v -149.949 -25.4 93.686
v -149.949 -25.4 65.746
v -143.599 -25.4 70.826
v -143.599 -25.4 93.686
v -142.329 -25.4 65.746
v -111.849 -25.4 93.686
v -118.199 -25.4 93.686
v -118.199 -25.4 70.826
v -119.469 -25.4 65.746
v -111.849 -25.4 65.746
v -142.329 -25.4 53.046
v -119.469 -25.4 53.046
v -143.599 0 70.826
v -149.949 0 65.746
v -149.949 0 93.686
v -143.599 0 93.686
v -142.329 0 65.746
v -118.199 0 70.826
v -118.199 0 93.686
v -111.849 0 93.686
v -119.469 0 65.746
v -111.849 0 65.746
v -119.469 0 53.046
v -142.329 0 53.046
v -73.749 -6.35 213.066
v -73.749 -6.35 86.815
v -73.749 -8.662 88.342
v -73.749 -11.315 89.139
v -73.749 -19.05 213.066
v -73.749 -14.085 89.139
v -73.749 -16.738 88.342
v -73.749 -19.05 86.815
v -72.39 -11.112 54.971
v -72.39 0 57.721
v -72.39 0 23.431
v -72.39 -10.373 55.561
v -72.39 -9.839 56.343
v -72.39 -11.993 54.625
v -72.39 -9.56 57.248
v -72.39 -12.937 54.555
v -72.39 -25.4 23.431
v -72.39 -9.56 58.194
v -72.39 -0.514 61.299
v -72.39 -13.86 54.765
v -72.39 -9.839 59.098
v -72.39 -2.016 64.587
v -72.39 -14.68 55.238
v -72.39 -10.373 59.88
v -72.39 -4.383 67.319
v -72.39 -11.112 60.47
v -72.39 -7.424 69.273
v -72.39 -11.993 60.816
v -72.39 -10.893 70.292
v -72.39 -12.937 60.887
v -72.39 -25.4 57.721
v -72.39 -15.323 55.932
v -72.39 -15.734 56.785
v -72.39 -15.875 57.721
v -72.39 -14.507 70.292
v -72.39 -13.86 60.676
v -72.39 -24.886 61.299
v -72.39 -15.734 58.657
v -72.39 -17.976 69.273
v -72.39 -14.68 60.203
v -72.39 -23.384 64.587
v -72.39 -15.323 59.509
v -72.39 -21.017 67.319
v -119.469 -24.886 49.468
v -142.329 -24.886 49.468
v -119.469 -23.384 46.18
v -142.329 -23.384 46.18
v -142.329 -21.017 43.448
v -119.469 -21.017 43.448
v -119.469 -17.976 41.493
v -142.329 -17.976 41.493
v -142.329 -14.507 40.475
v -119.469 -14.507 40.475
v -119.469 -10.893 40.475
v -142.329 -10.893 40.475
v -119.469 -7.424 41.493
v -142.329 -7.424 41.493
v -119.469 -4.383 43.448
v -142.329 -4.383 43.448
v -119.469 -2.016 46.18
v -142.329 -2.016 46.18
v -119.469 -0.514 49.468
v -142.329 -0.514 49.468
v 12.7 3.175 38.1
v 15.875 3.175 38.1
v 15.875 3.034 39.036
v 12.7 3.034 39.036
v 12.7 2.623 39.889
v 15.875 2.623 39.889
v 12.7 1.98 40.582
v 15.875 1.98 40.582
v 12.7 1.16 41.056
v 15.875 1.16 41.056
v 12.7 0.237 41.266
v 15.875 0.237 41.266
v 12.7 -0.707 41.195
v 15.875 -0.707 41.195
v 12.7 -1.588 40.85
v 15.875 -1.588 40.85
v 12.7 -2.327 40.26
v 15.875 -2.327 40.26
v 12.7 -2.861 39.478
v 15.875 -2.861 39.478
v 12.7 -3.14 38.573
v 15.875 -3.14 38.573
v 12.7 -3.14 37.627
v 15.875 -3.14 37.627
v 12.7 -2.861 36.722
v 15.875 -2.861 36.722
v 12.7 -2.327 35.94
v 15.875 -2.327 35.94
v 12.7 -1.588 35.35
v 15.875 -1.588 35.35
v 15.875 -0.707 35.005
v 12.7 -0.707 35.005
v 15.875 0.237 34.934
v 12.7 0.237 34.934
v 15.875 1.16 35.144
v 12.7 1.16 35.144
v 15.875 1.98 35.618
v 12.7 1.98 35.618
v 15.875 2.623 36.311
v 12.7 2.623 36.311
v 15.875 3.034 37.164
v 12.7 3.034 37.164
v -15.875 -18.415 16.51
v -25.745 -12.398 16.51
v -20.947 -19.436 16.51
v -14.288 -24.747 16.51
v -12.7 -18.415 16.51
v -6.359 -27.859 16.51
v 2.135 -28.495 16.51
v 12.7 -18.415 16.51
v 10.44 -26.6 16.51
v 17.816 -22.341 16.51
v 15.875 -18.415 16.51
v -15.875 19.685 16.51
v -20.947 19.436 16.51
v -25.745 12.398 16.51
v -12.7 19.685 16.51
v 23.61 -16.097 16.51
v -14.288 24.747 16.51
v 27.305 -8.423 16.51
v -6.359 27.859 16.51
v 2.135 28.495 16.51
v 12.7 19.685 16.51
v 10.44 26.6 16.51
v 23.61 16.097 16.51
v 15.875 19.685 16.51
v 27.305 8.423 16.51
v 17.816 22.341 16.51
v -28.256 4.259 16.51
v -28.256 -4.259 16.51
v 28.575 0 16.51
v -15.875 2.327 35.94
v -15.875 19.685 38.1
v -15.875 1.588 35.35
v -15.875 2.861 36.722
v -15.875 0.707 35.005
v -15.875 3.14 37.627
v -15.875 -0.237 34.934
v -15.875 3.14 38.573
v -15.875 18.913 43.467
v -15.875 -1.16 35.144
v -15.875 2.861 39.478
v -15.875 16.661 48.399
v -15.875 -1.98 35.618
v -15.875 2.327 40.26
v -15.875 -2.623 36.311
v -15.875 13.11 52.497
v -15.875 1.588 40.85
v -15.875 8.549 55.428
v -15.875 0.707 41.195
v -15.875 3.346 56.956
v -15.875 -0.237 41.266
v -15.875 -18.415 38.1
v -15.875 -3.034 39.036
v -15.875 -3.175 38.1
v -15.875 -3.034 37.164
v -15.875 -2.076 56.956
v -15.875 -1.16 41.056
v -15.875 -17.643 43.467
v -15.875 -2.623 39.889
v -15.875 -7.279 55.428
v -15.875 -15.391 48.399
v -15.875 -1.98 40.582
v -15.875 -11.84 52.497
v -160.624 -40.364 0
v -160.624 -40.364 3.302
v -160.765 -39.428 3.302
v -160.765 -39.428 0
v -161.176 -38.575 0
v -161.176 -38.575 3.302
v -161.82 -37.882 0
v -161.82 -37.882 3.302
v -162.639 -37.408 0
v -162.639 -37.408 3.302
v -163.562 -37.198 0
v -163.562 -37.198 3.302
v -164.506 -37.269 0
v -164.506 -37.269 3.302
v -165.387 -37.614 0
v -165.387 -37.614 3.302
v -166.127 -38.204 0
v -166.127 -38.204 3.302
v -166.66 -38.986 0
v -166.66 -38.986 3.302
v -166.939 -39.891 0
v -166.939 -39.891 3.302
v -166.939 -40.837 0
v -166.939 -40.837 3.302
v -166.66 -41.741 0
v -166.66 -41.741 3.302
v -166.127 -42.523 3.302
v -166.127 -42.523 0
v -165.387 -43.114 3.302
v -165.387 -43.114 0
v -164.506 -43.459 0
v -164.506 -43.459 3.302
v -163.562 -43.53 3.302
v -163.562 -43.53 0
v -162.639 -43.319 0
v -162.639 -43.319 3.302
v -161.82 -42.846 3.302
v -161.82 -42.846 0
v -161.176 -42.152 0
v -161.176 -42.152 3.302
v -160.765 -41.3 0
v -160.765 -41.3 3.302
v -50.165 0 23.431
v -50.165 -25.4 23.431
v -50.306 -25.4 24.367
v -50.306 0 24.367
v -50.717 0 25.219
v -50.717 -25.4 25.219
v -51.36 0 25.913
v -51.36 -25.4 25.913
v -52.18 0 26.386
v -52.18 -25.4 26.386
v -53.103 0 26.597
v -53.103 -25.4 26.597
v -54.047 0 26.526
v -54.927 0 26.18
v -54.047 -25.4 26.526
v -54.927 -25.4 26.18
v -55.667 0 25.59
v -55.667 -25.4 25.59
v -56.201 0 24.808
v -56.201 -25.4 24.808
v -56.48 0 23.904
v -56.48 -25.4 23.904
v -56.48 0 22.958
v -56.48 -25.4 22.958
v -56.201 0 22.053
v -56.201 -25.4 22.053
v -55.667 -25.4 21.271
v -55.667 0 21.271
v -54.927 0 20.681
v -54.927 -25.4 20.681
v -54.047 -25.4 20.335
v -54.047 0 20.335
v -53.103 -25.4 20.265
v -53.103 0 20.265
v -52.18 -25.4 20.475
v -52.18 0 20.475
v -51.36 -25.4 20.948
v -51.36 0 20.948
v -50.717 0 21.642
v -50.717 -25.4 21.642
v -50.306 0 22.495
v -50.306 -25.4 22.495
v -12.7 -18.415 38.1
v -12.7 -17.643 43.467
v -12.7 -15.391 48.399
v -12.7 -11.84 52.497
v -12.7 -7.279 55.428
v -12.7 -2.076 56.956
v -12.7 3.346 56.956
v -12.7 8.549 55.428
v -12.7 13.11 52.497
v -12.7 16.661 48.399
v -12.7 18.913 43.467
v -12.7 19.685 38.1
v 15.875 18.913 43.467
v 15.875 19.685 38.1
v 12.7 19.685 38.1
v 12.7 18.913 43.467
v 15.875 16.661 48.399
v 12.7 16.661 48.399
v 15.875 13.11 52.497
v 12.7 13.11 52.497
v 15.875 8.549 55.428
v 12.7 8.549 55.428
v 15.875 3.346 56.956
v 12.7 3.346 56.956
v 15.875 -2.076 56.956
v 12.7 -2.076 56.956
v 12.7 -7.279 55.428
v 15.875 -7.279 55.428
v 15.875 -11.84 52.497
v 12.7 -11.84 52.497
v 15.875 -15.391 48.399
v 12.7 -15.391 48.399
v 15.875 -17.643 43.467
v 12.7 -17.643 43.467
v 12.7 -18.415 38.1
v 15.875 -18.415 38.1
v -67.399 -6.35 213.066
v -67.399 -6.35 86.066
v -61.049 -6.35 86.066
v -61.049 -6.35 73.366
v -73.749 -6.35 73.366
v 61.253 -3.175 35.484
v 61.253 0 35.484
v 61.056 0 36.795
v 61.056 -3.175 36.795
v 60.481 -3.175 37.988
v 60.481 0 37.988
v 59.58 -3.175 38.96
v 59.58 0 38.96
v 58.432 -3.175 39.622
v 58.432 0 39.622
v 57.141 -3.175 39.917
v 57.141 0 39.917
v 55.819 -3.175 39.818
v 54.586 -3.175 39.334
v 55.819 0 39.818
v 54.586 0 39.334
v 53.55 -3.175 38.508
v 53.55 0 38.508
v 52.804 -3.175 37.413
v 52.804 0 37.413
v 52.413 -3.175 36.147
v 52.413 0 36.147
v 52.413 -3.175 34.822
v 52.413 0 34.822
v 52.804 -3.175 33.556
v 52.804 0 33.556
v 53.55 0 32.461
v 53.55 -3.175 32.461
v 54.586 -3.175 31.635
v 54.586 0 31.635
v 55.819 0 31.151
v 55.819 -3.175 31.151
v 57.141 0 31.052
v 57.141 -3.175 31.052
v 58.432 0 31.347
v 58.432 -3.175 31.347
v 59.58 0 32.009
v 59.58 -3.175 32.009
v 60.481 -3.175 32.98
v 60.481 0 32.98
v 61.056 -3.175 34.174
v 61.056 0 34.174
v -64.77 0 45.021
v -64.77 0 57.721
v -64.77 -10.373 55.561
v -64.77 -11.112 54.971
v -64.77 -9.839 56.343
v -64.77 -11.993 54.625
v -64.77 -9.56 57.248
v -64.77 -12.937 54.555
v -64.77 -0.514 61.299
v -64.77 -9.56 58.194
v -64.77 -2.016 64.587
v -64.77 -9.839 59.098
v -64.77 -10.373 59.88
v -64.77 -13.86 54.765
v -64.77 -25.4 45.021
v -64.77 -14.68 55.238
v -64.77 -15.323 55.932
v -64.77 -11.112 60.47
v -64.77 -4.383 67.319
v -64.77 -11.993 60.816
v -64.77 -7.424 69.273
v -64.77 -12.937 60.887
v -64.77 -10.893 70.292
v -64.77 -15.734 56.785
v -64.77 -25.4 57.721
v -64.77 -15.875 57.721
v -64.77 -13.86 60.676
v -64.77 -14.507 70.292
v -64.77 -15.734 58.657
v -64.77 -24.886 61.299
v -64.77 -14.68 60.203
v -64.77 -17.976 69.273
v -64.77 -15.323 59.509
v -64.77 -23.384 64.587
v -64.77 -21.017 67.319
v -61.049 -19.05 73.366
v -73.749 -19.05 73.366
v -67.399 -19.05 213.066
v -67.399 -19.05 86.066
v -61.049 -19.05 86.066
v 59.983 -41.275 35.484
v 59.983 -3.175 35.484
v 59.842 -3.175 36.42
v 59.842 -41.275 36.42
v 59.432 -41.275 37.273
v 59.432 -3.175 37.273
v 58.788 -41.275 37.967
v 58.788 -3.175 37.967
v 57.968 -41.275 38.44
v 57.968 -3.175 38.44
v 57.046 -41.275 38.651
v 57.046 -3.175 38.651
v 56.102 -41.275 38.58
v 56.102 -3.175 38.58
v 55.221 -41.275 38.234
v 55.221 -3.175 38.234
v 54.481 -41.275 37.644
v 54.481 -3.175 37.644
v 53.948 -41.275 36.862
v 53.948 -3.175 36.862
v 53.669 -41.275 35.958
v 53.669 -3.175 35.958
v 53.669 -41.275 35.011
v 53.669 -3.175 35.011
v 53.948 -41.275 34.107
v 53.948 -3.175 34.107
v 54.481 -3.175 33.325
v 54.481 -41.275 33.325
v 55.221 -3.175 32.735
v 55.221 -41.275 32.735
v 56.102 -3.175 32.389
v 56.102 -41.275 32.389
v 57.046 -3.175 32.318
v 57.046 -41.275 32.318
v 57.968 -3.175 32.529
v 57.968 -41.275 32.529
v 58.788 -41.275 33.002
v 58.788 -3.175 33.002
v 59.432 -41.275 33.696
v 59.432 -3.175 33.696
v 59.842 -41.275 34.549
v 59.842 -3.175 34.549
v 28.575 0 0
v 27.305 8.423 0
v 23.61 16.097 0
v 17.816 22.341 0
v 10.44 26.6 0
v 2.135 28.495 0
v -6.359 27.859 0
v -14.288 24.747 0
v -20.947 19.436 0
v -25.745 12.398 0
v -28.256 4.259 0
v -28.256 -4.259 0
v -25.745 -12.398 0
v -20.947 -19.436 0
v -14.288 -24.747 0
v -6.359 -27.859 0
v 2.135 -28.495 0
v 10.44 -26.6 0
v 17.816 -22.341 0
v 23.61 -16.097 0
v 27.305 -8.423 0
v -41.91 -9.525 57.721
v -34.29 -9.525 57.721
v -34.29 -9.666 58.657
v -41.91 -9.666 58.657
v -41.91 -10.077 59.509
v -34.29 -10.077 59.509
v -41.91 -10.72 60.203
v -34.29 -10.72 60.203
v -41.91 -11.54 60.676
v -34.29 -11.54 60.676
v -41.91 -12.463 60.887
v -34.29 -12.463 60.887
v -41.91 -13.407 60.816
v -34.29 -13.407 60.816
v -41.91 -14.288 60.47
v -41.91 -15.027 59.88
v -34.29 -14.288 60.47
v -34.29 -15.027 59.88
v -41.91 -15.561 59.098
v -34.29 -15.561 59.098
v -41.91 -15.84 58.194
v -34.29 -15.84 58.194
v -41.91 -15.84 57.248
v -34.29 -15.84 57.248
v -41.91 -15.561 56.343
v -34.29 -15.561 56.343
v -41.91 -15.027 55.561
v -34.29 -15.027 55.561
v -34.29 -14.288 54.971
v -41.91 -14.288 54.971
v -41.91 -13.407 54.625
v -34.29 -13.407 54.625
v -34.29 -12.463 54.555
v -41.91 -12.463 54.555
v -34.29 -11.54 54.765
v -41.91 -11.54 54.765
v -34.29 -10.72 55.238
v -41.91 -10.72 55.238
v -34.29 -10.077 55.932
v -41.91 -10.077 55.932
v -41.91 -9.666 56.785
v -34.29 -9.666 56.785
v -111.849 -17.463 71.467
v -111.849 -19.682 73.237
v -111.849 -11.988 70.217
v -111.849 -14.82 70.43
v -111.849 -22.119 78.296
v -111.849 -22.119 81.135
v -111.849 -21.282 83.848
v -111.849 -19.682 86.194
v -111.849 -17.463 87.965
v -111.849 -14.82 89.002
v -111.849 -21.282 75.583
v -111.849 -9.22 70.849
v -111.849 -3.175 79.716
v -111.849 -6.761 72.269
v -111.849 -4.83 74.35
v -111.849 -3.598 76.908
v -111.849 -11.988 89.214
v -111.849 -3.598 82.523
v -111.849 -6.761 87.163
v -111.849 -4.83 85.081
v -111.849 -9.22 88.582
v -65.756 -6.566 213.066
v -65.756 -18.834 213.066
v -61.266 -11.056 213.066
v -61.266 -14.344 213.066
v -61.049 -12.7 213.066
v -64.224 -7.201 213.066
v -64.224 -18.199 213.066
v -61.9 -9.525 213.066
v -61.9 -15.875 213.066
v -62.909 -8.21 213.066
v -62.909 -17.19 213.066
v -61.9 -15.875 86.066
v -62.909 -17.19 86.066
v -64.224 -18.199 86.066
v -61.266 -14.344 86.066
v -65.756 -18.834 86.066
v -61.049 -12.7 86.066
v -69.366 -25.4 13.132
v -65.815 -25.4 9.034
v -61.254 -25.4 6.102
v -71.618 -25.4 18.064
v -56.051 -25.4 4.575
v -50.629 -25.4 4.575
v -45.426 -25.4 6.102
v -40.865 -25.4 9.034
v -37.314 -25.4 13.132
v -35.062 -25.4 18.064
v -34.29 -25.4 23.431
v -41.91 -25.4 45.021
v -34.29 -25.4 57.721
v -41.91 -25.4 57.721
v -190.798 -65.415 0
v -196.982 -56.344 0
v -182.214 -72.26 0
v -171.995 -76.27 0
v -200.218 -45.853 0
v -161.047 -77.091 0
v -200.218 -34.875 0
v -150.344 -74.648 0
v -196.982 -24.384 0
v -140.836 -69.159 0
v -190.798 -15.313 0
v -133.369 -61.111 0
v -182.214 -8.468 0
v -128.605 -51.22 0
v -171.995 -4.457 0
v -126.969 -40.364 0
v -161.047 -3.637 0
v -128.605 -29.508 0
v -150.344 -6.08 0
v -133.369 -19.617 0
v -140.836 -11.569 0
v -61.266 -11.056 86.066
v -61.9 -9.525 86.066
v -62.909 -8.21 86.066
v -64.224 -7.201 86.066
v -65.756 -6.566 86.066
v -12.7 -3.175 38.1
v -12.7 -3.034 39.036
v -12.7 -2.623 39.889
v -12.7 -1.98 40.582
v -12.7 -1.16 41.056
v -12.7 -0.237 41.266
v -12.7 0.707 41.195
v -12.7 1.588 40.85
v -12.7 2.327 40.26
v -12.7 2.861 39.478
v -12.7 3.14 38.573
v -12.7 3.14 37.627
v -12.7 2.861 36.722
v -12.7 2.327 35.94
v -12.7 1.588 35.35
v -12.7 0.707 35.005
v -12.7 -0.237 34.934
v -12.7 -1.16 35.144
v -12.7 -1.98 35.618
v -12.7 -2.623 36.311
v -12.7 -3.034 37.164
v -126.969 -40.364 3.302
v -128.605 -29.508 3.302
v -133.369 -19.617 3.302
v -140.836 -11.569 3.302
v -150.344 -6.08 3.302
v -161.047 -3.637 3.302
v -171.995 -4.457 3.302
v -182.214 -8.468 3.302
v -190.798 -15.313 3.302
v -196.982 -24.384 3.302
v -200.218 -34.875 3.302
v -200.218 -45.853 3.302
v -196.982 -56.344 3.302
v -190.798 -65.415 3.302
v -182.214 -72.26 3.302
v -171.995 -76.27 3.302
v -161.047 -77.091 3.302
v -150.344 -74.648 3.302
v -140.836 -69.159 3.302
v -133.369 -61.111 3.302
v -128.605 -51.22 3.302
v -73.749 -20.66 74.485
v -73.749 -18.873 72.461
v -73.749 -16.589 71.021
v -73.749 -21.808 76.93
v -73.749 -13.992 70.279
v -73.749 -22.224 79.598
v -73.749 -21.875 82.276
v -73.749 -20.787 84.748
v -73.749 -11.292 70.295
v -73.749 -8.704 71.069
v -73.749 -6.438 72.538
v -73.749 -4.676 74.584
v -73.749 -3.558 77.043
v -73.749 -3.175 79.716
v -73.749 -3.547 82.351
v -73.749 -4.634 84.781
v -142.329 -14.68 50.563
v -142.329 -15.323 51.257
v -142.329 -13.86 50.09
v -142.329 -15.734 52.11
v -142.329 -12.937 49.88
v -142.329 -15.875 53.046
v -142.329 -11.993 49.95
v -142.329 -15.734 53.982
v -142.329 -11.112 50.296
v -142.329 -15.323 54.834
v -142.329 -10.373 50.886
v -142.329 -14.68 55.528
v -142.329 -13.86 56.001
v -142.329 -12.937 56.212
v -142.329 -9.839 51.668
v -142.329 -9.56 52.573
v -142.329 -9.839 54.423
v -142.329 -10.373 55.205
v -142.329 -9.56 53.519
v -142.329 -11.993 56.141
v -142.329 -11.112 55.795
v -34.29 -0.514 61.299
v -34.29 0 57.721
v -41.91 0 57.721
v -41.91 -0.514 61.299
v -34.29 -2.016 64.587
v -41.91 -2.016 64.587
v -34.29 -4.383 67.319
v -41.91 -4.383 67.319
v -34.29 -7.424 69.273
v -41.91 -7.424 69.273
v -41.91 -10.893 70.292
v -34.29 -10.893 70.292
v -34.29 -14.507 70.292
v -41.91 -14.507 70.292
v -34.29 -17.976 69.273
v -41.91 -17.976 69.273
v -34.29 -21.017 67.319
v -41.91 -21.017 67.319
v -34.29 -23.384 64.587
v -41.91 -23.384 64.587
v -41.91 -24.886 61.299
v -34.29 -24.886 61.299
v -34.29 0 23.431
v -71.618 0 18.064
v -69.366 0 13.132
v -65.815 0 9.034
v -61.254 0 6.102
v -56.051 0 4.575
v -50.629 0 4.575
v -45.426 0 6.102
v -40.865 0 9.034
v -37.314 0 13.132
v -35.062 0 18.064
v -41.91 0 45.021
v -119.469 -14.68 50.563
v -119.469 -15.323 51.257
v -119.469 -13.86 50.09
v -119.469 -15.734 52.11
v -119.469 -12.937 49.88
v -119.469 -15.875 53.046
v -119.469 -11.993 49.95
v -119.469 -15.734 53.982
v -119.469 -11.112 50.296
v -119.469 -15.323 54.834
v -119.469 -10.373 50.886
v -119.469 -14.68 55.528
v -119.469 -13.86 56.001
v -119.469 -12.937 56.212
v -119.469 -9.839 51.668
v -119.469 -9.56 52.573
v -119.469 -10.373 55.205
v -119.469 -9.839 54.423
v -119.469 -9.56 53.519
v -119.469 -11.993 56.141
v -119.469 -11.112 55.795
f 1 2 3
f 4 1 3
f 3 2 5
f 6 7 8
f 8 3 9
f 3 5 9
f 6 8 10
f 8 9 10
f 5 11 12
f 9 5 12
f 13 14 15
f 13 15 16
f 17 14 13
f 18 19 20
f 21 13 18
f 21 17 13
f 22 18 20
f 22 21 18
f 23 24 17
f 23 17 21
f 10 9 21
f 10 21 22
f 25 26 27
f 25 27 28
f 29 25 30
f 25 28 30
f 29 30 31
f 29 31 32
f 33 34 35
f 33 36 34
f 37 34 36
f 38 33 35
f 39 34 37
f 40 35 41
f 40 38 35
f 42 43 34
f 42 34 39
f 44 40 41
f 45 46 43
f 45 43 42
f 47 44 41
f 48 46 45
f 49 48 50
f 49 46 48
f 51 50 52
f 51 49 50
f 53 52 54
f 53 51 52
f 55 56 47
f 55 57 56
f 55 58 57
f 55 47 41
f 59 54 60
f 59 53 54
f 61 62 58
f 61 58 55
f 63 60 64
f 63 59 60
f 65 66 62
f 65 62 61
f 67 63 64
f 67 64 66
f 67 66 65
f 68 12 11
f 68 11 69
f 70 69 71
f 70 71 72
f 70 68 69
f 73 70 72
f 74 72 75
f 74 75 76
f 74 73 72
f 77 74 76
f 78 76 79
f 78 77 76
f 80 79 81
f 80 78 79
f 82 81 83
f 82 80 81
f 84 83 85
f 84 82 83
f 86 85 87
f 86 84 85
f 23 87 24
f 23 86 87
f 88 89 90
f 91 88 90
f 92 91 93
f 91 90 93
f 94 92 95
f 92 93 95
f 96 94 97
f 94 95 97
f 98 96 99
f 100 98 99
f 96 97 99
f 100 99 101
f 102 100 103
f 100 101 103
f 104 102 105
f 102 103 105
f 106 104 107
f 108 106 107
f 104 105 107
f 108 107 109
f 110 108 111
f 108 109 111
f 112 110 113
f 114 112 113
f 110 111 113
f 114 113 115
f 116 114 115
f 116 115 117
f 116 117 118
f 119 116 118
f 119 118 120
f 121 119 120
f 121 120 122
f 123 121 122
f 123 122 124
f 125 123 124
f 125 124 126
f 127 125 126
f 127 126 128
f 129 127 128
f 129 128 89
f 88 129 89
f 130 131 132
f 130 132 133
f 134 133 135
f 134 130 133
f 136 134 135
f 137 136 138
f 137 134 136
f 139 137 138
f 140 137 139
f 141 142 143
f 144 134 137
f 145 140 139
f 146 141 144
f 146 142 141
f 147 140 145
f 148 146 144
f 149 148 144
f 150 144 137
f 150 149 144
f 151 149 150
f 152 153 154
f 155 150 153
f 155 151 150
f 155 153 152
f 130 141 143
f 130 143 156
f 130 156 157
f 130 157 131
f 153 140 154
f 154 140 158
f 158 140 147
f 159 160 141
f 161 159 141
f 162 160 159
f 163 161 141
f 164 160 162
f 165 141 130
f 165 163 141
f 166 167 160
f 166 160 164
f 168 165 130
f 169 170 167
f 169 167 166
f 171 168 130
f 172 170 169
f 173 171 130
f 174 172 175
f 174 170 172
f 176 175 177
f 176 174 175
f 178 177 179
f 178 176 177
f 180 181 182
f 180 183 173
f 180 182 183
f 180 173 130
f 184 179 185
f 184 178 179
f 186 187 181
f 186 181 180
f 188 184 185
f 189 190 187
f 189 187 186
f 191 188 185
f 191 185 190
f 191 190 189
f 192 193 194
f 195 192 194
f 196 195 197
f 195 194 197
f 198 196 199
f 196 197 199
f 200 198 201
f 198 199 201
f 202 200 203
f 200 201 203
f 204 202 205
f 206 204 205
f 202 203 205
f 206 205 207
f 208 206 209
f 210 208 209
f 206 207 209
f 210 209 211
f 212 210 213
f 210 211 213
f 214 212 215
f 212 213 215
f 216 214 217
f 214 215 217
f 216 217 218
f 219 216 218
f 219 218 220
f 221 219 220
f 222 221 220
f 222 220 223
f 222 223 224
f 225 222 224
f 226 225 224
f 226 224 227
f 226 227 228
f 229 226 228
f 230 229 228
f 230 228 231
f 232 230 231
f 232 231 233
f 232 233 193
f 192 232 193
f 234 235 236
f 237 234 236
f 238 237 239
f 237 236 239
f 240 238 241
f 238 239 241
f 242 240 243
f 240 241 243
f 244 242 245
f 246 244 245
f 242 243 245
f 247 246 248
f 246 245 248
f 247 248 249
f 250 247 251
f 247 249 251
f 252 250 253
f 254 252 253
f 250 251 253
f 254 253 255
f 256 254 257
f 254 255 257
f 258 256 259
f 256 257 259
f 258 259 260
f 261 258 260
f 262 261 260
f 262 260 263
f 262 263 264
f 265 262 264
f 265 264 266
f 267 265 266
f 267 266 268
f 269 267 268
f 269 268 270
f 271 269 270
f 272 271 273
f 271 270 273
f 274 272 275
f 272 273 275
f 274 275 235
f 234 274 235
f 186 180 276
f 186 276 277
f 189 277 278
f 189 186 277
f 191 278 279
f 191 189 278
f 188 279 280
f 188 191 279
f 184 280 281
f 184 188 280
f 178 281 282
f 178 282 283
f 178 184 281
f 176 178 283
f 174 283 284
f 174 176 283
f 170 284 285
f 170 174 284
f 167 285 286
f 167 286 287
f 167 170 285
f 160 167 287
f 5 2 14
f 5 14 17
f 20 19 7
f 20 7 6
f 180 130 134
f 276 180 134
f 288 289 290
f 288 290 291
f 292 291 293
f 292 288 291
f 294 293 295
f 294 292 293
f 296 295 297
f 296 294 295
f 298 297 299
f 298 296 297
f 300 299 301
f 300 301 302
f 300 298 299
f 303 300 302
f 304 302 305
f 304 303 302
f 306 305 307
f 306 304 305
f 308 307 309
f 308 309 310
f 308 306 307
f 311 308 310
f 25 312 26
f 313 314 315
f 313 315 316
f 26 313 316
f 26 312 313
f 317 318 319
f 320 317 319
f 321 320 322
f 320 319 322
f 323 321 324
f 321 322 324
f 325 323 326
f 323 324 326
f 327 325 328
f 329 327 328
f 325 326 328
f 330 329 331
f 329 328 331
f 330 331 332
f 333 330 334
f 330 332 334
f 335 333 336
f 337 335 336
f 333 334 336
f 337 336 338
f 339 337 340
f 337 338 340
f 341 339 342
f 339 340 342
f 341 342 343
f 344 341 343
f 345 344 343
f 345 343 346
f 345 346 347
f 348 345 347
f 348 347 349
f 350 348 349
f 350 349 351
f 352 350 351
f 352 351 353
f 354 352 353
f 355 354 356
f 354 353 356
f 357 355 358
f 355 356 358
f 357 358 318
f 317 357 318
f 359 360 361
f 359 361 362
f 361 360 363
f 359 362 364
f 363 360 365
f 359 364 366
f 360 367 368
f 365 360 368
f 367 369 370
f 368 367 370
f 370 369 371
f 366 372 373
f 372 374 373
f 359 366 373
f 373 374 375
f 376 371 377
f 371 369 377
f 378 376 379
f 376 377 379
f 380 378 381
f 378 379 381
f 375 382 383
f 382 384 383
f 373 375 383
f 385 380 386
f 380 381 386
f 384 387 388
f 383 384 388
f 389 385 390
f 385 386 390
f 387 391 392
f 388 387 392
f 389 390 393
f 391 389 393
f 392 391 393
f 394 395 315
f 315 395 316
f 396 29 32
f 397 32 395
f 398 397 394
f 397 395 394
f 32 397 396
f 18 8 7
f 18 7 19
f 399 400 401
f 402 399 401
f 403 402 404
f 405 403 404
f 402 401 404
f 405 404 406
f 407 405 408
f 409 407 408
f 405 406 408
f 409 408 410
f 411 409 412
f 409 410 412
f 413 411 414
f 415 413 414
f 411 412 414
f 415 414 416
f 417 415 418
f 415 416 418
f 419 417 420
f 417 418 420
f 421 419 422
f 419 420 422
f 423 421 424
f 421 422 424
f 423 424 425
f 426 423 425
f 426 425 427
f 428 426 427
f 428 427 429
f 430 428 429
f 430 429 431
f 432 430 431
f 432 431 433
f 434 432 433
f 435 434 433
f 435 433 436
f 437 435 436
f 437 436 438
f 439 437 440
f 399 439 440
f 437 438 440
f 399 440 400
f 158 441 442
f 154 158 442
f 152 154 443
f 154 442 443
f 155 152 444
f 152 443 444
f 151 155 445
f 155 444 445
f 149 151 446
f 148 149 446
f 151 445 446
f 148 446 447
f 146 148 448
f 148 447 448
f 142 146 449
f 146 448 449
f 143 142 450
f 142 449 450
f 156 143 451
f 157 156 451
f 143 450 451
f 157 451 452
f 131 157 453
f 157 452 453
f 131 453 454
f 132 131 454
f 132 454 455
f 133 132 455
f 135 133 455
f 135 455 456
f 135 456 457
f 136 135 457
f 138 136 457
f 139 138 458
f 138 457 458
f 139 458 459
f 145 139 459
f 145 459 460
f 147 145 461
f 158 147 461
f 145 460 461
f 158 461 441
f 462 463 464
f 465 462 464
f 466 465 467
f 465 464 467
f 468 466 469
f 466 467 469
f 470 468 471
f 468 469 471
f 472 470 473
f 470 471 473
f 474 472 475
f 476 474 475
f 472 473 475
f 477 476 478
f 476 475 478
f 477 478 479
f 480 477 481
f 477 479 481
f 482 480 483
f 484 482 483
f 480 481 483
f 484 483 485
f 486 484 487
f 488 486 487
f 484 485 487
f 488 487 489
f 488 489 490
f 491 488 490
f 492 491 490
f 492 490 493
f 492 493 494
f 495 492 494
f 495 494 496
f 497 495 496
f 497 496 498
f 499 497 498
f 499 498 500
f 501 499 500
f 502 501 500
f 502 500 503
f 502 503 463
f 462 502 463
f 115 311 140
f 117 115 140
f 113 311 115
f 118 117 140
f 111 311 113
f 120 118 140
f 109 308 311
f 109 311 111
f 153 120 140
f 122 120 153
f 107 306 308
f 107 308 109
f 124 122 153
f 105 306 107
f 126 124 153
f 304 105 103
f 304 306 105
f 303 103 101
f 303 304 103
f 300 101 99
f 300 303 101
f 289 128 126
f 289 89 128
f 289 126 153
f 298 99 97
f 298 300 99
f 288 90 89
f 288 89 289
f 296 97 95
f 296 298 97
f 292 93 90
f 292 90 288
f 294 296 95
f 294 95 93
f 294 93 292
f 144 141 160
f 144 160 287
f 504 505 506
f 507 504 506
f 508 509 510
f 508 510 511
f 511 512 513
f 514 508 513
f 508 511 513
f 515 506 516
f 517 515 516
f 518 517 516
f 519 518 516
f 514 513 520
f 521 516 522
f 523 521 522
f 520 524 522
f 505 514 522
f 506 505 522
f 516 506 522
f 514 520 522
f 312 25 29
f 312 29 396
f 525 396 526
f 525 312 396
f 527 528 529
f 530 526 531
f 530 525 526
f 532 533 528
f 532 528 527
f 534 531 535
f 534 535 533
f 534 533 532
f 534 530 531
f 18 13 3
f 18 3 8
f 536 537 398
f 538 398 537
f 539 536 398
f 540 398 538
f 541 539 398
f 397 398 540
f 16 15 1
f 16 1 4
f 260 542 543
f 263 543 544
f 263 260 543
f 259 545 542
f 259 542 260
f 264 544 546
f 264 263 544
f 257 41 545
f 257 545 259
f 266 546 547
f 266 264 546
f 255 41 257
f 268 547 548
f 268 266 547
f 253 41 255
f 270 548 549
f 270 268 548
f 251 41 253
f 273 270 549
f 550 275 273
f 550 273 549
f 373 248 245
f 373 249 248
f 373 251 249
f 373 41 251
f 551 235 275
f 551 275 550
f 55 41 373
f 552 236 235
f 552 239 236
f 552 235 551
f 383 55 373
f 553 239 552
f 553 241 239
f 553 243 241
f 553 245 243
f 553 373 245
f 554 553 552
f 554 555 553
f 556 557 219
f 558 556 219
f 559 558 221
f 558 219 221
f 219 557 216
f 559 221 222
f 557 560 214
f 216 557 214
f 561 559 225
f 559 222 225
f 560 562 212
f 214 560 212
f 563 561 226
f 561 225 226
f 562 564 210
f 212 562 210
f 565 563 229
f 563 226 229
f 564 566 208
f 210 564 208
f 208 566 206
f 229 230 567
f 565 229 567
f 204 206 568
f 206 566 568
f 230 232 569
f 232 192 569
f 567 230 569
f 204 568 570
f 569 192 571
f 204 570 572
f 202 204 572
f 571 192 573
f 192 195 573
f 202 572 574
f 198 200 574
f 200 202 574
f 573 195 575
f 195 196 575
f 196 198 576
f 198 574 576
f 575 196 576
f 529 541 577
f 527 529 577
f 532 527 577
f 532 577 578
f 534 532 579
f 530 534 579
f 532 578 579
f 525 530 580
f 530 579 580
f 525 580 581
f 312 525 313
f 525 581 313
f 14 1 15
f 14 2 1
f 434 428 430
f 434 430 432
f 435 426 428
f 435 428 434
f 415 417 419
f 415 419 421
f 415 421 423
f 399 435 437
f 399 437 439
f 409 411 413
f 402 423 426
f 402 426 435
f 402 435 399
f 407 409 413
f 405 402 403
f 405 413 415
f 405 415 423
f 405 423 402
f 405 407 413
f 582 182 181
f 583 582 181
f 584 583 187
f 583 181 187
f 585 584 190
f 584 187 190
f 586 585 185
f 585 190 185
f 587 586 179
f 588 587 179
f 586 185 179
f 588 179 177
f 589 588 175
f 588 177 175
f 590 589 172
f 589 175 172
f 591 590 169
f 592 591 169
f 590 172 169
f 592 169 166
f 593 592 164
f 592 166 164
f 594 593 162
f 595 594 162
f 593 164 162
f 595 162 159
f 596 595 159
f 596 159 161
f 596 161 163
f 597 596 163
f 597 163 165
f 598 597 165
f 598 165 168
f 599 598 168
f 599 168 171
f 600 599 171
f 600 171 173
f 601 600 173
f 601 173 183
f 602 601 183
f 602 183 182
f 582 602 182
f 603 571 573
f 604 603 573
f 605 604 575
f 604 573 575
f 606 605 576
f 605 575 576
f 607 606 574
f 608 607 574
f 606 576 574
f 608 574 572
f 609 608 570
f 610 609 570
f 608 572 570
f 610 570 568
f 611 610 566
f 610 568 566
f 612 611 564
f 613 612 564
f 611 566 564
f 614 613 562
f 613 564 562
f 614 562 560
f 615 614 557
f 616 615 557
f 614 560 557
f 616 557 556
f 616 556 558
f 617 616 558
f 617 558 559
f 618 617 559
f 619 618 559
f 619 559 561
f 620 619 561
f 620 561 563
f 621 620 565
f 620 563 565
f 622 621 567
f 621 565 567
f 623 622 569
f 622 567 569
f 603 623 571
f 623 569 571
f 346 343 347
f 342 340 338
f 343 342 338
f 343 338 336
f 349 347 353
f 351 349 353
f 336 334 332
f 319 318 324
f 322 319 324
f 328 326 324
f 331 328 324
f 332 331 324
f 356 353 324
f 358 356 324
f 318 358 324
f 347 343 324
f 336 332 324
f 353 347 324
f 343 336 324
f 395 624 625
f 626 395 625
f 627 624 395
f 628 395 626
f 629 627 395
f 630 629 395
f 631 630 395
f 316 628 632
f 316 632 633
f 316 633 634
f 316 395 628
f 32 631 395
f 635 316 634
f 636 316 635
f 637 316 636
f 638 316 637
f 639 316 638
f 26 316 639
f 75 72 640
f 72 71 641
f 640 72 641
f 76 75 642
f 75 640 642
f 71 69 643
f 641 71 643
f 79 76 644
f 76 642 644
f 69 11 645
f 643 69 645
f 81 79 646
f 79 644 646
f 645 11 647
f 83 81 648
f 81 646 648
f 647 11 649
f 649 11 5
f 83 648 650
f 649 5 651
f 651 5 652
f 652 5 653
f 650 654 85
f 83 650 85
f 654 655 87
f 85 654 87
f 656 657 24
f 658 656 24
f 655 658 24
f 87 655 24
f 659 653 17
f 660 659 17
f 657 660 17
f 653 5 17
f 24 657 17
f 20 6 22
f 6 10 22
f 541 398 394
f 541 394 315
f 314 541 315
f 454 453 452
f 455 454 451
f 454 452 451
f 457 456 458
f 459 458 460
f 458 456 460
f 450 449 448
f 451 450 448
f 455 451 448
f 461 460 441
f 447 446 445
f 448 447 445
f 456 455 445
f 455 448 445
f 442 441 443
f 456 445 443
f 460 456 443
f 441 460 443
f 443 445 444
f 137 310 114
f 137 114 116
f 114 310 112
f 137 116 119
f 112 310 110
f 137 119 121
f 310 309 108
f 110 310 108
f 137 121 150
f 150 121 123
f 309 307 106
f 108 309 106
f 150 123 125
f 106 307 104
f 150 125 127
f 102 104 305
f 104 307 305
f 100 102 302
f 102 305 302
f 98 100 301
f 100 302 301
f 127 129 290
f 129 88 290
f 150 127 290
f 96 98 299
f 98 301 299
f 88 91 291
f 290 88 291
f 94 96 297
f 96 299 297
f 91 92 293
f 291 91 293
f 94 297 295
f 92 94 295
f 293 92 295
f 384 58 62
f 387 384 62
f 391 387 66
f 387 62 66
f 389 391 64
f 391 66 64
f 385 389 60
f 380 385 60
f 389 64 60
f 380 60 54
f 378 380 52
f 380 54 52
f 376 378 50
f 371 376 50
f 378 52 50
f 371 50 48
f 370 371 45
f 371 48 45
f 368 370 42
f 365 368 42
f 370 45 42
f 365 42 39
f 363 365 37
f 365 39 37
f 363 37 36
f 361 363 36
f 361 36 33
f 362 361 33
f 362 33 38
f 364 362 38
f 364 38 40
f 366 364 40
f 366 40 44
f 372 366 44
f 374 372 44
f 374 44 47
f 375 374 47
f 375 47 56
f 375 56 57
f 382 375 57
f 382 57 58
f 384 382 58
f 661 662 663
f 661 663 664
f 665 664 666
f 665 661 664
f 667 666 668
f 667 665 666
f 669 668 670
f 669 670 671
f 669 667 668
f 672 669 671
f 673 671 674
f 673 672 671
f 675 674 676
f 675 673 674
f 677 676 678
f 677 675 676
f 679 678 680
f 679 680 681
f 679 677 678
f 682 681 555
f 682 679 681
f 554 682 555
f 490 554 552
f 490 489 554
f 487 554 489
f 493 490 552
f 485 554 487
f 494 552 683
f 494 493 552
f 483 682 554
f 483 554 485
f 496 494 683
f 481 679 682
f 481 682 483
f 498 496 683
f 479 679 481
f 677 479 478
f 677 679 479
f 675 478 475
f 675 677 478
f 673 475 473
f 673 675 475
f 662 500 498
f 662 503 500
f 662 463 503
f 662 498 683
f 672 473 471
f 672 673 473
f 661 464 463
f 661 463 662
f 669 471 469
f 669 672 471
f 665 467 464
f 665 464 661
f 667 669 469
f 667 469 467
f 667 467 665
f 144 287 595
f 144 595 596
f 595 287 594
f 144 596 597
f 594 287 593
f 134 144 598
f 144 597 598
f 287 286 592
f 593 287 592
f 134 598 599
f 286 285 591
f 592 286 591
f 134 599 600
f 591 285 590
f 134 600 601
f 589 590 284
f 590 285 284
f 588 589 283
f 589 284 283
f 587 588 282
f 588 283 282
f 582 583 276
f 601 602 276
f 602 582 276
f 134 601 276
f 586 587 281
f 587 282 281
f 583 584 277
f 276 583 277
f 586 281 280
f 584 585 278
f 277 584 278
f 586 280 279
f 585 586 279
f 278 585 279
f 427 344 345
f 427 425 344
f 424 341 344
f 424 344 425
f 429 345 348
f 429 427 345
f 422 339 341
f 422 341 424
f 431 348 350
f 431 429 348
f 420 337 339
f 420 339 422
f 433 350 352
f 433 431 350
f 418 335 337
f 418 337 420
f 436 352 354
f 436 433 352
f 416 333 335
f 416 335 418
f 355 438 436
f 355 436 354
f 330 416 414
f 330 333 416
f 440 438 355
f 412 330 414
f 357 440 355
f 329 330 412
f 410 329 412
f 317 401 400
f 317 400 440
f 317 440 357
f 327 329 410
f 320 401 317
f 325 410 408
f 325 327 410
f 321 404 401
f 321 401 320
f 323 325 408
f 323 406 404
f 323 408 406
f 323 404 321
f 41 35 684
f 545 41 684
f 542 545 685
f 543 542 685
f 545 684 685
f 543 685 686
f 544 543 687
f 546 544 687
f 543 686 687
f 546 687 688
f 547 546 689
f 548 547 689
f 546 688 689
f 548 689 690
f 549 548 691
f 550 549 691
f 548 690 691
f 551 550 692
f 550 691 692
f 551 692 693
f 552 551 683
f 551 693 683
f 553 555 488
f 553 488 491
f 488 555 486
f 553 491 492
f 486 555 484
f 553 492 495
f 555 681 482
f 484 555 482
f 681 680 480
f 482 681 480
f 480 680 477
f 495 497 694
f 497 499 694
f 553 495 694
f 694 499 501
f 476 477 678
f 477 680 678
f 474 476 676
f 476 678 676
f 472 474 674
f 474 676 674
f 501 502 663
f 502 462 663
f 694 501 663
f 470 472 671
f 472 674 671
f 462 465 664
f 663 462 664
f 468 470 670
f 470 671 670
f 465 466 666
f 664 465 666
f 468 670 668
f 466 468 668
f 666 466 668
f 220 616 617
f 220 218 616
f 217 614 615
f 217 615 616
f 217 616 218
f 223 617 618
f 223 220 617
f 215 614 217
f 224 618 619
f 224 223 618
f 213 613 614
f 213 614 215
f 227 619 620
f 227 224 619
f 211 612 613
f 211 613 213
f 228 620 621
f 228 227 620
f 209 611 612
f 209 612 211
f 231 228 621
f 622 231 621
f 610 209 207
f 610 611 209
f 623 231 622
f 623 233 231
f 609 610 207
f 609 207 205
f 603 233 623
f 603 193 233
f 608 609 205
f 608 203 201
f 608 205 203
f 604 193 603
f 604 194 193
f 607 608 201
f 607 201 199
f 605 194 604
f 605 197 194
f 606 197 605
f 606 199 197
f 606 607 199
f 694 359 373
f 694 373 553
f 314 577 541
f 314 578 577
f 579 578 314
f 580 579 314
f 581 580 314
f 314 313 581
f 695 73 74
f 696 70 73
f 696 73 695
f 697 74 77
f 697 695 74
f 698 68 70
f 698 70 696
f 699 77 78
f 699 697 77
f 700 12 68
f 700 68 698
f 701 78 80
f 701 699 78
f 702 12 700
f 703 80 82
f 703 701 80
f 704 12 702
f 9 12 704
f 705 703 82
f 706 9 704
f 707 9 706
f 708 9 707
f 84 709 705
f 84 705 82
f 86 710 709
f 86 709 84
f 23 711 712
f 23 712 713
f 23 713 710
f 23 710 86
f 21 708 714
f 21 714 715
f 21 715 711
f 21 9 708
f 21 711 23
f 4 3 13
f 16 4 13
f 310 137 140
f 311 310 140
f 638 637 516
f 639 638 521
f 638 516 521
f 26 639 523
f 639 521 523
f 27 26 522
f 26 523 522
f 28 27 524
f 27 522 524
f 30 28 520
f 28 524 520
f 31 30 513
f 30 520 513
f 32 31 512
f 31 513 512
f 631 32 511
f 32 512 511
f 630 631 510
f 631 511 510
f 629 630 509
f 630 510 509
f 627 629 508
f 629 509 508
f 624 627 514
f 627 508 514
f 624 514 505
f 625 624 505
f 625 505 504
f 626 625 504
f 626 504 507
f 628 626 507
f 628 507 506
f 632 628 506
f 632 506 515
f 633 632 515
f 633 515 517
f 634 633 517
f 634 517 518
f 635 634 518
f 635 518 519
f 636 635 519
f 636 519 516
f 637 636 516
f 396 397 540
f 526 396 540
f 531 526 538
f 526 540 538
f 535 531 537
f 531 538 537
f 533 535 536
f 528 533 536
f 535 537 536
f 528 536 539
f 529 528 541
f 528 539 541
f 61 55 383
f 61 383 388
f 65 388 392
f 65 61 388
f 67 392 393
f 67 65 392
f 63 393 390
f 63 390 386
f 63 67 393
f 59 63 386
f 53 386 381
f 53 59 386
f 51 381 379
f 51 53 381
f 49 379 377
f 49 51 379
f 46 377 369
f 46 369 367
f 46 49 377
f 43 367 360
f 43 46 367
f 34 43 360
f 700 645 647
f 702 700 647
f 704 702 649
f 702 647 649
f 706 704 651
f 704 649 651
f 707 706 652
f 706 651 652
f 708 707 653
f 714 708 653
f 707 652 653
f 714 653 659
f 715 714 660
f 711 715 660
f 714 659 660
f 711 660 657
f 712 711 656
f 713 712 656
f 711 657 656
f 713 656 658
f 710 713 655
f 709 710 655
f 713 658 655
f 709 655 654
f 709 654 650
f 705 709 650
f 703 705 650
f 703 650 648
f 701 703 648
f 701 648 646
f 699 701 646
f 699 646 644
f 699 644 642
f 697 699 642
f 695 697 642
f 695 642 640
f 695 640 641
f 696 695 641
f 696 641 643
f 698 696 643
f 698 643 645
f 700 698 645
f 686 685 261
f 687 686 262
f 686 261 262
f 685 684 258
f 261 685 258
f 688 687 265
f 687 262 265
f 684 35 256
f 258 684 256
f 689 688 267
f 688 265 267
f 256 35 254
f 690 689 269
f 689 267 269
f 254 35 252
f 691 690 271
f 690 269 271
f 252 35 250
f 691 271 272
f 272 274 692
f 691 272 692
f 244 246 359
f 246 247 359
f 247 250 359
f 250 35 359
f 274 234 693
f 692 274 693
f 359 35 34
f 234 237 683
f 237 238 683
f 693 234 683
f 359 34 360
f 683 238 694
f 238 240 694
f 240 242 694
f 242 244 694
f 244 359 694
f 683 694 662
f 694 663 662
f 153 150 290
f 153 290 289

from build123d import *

# Parameters (mm, degrees)
F0_R      = 28.575
F1_DEPTH  = 16.51
F2_W      = 3.175
F2_H      = 38.1
F3_DEPTH  = 21.59
F5_DEPTH  = 3.175
F7_DEPTH  = 3.175
F8_R      = 3.175
F9_DEPTH  = 25.4
F10_R     = 3.175
F11_DEPTH = 25.4
F12_W     = 38.1
F12_H     = 34.29
F13_DEPTH = 25.4
F14_R     = 3.175
F15_DEPTH = 25.4
F16_W     = 22.86
F16_H     = 12.7
F17_DEPTH = 25.4
F19_DEPTH = 7.62
F21_DEPTH = 7.62
F22_R     = 3.175
F23_DEPTH = 12.7
F24_R     = 3.175
F25_DEPTH = 25.4
F26_W     = 22.86
F26_H     = 12.7
F27_DEPTH = 25.4
F29_DEPTH = 22.86
F30_R     = 3.175
F31_DEPTH = 25.4
F32_W     = 38.1
F32_H     = 5.08
F33_DEPTH = 25.4
F34_W     = 6.35
F34_H     = 25.4
F35_DEPTH = 22.86
F36_W     = 6.35
F36_H     = 25.4
F37_DEPTH = 22.86
F38_R     = 36.83
F39_DEPTH = 3.302
F40_R     = 3.175
F41_DEPTH = 25.4
F42_R     = 4.445
F43_DEPTH = 3.175
F44_R     = 3.175
F45_DEPTH = 38.1
F46_R     = 9.525
F47_DEPTH = 38.1
F48_W     = 12.7
F48_H     = 12.7
F49_DEPTH = 12.7
F51_DEPTH = 127


with BuildPart() as f1:
    # F0 (on Top) → F1 (new body)
    with BuildSketch(Plane.XY):
        Circle(F0_R)
    extrude(amount=F1_DEPTH)

    # F2 (on face) → F3 (join)
    with BuildSketch(Plane.XY.offset(16.51)):
        with Locations((-14.2875, 0.635)):
            Rectangle(F2_W, F2_H)
        with Locations((14.2875, 0.635)):
            Rectangle(F2_W, F2_H)
    extrude(amount=F3_DEPTH)

    # F4 (on face) → F5 (join)
    with BuildSketch(Plane(origin=(-15.875, 0, 0), x_dir=(0, -1, 0), z_dir=(-1, 0, 0))):
        with BuildLine():
            Line((-19.685, 38.1), (18.415, 38.1))
            ThreePointArc((18.415, 38.1), (-0.635, 57.15), (-19.685, 38.1))
        make_face()
    extrude(amount=-F5_DEPTH)

    # F6 (on face) → F7 (join)
    with BuildSketch(Plane.YZ.offset(15.875)):
        with BuildLine():
            Line((-18.415, 38.1), (19.685, 38.1))
            ThreePointArc((19.685, 38.1), (0.635, 57.15), (-18.415, 38.1))
        make_face()
    extrude(amount=-F7_DEPTH)

    # F8 (on face) → F9 (cut)
    with BuildSketch(Plane(origin=(-15.875, 0, 0), x_dir=(0, -1, 0), z_dir=(-1, 0, 0))):
        with Locations((0, 38.1)):
            Circle(F8_R)
    extrude(amount=-F9_DEPTH, mode=Mode.SUBTRACT)

    # F10 (on face) → F11 (cut)
    with BuildSketch(Plane.YZ.offset(15.875)):
        with Locations((0, 38.1)):
            Circle(F10_R)
    extrude(amount=-F11_DEPTH, mode=Mode.SUBTRACT)


with BuildPart() as f13:
    # F12 (on Front) → F13 (new body)
    with BuildSketch(Plane.XZ):
        with Locations((-53.339999, 40.575786)):
            Rectangle(F12_W, F12_H)
        with BuildLine():
            Line((-34.289999, 23.430786), (-72.389999, 23.430786))
            ThreePointArc((-72.389999, 23.430786), (-53.339999, 4.380786), (-34.289999, 23.430786))
        make_face()
    extrude(amount=F13_DEPTH)

    # F14 (on face) → F15 (cut)
    with BuildSketch(Plane.XZ.offset(25.4)):
        with Locations((-53.339999, 23.430786)):
            Circle(F14_R)
    extrude(amount=-F15_DEPTH, mode=Mode.SUBTRACT)

    # F16 (on face) → F17 (cut)
    with BuildSketch(Plane.XZ.offset(25.4)):
        with Locations((-53.339999, 51.370786)):
            Rectangle(F16_W, F16_H)
    extrude(amount=-F17_DEPTH, mode=Mode.SUBTRACT)

    # F18 (on face) → F19 (join)
    with BuildSketch(Plane(origin=(-72.389999, 0, 0), x_dir=(0, -1, 0), z_dir=(-1, 0, 0))):
        with BuildLine():
            Line((0, 57.720786), (25.4, 57.720786))
            ThreePointArc((25.4, 57.720786), (12.7, 70.420786), (0, 57.720786))
        make_face()
    extrude(amount=-F19_DEPTH)

    # F20 (on face) → F21 (join)
    with BuildSketch(Plane.YZ.offset(-34.289999)):
        with BuildLine():
            Line((-25.4, 57.720786), (0, 57.720786))
            ThreePointArc((0, 57.720786), (-12.7, 70.420786), (-25.4, 57.720786))
        make_face()
    extrude(amount=-F21_DEPTH)

    # F22 (on face) → F23 (cut)
    with BuildSketch(Plane(origin=(-72.389999, 0, 0), x_dir=(0, -1, 0), z_dir=(-1, 0, 0))):
        with Locations((12.7, 57.720786)):
            Circle(F22_R)
    extrude(amount=-F23_DEPTH, mode=Mode.SUBTRACT)

    # F24 (on face) → F25 (cut)
    with BuildSketch(Plane.YZ.offset(-34.289999)):
        with Locations((-12.7, 57.720786)):
            Circle(F24_R)
    extrude(amount=-F25_DEPTH, mode=Mode.SUBTRACT)


with BuildPart() as f27:
    # F26 (on Front) → F27 (new body)
    with BuildSketch(Plane.XZ):
        with Locations((-130.899448, 59.395756)):
            Rectangle(F26_W, F26_H)
    extrude(amount=F27_DEPTH)

    # F28 (on face) → F29 (join)
    with BuildSketch(Plane.YZ.offset(-119.469448)):
        with BuildLine():
            Line((0, 53.045756), (-25.4, 53.045756))
            ThreePointArc((-25.4, 53.045756), (-12.7, 40.345756), (0, 53.045756))
        make_face()
    extrude(amount=-F29_DEPTH)

    # F30 (on face) → F31 (cut)
    with BuildSketch(Plane(origin=(-142.329448, 0, 0), x_dir=(0, -1, 0), z_dir=(-1, 0, 0))):
        with Locations((12.7, 53.045756)):
            Circle(F30_R)
    extrude(amount=-F31_DEPTH, mode=Mode.SUBTRACT)

    # F32 (on face) → F33 (join)
    with BuildSketch(Plane.XZ.offset(25.4)):
        with Locations((-130.899448, 68.285756)):
            Rectangle(F32_W, F32_H)
    extrude(amount=-F33_DEPTH)

    # F34 (on face) → F35 (join)
    with BuildSketch(Plane.XY.offset(70.825756)):
        with Locations((-146.774448, -12.7)):
            Rectangle(F34_W, F34_H)
    extrude(amount=F35_DEPTH)

    # F36 (on face) → F37 (join)
    with BuildSketch(Plane.XY.offset(70.825756)):
        with Locations((-115.024448, -12.7)):
            Rectangle(F36_W, F36_H)
    extrude(amount=F37_DEPTH)


with BuildPart() as f39:
    # F38 (on Top) → F39 (new body)
    with BuildSketch(Plane.XY):
        with Locations((-163.799211, -40.363897)):
            Circle(F38_R)
    extrude(amount=F39_DEPTH)

    # F40 (on face) → F41 (cut)
    with BuildSketch(Plane.XY.offset(3.302)):
        with Locations((-163.799211, -40.363897)):
            Circle(F40_R)
    extrude(amount=-F41_DEPTH, mode=Mode.SUBTRACT)


with BuildPart() as f43:
    # F42 (on Front) → F43 (new body)
    with BuildSketch(Plane.XZ):
        with Locations((56.808472, 35.484426)):
            Circle(F42_R)
    extrude(amount=F43_DEPTH)

    # F44 (on face) → F45 (join)
    with BuildSketch(Plane.XZ.offset(3.175)):
        with Locations((56.808472, 35.484426)):
            Circle(F44_R)
    extrude(amount=F45_DEPTH)


with BuildPart() as f47:
    # F46 (on face) → F47 (new body)
    with BuildSketch(Plane.YZ.offset(-111.849448)):
        with Locations((-12.7, 79.715756)):
            Circle(F46_R)
    extrude(amount=F47_DEPTH)

    # F48 (on face) → F49 (join)
    with BuildSketch(Plane.YZ.offset(-73.749448)):
        with Locations((-12.7, 79.715756)):
            Rectangle(F48_W, F48_H)
    extrude(amount=F49_DEPTH)

    # F50 (on face) → F51 (join)
    with BuildSketch(Plane.XY.offset(86.065756)):
        with BuildLine():
            ThreePointArc((-67.399448, -19.05), (-62.90932, -17.190128), (-61.049448, -12.7))
            ThreePointArc((-61.049448, -12.7), (-62.90932, -8.209872), (-67.399448, -6.35))
            ThreePointArc((-67.399448, -6.35), (-71.889576, -8.209872), (-73.749448, -12.7))
            ThreePointArc((-73.749448, -12.7), (-71.889576, -17.190128), (-67.399448, -19.05))
        make_face()
        with BuildLine():
            Line((-73.749448, -19.05), (-67.399448, -19.05))
            ThreePointArc((-67.399448, -19.05), (-71.889576, -17.190128), (-73.749448, -12.7))
            Line((-73.749448, -12.7), (-73.749448, -19.05))
        make_face()
        with BuildLine():
            ThreePointArc((-73.749448, -12.7), (-71.889576, -8.209872), (-67.399448, -6.35))
            Line((-67.399448, -6.35), (-73.749448, -6.35))
            Line((-73.749448, -6.35), (-73.749448, -12.7))
        make_face()
    extrude(amount=F51_DEPTH)


solid = Compound([f1.part, f13.part, f27.part, f39.part, f43.part, f47.part])
